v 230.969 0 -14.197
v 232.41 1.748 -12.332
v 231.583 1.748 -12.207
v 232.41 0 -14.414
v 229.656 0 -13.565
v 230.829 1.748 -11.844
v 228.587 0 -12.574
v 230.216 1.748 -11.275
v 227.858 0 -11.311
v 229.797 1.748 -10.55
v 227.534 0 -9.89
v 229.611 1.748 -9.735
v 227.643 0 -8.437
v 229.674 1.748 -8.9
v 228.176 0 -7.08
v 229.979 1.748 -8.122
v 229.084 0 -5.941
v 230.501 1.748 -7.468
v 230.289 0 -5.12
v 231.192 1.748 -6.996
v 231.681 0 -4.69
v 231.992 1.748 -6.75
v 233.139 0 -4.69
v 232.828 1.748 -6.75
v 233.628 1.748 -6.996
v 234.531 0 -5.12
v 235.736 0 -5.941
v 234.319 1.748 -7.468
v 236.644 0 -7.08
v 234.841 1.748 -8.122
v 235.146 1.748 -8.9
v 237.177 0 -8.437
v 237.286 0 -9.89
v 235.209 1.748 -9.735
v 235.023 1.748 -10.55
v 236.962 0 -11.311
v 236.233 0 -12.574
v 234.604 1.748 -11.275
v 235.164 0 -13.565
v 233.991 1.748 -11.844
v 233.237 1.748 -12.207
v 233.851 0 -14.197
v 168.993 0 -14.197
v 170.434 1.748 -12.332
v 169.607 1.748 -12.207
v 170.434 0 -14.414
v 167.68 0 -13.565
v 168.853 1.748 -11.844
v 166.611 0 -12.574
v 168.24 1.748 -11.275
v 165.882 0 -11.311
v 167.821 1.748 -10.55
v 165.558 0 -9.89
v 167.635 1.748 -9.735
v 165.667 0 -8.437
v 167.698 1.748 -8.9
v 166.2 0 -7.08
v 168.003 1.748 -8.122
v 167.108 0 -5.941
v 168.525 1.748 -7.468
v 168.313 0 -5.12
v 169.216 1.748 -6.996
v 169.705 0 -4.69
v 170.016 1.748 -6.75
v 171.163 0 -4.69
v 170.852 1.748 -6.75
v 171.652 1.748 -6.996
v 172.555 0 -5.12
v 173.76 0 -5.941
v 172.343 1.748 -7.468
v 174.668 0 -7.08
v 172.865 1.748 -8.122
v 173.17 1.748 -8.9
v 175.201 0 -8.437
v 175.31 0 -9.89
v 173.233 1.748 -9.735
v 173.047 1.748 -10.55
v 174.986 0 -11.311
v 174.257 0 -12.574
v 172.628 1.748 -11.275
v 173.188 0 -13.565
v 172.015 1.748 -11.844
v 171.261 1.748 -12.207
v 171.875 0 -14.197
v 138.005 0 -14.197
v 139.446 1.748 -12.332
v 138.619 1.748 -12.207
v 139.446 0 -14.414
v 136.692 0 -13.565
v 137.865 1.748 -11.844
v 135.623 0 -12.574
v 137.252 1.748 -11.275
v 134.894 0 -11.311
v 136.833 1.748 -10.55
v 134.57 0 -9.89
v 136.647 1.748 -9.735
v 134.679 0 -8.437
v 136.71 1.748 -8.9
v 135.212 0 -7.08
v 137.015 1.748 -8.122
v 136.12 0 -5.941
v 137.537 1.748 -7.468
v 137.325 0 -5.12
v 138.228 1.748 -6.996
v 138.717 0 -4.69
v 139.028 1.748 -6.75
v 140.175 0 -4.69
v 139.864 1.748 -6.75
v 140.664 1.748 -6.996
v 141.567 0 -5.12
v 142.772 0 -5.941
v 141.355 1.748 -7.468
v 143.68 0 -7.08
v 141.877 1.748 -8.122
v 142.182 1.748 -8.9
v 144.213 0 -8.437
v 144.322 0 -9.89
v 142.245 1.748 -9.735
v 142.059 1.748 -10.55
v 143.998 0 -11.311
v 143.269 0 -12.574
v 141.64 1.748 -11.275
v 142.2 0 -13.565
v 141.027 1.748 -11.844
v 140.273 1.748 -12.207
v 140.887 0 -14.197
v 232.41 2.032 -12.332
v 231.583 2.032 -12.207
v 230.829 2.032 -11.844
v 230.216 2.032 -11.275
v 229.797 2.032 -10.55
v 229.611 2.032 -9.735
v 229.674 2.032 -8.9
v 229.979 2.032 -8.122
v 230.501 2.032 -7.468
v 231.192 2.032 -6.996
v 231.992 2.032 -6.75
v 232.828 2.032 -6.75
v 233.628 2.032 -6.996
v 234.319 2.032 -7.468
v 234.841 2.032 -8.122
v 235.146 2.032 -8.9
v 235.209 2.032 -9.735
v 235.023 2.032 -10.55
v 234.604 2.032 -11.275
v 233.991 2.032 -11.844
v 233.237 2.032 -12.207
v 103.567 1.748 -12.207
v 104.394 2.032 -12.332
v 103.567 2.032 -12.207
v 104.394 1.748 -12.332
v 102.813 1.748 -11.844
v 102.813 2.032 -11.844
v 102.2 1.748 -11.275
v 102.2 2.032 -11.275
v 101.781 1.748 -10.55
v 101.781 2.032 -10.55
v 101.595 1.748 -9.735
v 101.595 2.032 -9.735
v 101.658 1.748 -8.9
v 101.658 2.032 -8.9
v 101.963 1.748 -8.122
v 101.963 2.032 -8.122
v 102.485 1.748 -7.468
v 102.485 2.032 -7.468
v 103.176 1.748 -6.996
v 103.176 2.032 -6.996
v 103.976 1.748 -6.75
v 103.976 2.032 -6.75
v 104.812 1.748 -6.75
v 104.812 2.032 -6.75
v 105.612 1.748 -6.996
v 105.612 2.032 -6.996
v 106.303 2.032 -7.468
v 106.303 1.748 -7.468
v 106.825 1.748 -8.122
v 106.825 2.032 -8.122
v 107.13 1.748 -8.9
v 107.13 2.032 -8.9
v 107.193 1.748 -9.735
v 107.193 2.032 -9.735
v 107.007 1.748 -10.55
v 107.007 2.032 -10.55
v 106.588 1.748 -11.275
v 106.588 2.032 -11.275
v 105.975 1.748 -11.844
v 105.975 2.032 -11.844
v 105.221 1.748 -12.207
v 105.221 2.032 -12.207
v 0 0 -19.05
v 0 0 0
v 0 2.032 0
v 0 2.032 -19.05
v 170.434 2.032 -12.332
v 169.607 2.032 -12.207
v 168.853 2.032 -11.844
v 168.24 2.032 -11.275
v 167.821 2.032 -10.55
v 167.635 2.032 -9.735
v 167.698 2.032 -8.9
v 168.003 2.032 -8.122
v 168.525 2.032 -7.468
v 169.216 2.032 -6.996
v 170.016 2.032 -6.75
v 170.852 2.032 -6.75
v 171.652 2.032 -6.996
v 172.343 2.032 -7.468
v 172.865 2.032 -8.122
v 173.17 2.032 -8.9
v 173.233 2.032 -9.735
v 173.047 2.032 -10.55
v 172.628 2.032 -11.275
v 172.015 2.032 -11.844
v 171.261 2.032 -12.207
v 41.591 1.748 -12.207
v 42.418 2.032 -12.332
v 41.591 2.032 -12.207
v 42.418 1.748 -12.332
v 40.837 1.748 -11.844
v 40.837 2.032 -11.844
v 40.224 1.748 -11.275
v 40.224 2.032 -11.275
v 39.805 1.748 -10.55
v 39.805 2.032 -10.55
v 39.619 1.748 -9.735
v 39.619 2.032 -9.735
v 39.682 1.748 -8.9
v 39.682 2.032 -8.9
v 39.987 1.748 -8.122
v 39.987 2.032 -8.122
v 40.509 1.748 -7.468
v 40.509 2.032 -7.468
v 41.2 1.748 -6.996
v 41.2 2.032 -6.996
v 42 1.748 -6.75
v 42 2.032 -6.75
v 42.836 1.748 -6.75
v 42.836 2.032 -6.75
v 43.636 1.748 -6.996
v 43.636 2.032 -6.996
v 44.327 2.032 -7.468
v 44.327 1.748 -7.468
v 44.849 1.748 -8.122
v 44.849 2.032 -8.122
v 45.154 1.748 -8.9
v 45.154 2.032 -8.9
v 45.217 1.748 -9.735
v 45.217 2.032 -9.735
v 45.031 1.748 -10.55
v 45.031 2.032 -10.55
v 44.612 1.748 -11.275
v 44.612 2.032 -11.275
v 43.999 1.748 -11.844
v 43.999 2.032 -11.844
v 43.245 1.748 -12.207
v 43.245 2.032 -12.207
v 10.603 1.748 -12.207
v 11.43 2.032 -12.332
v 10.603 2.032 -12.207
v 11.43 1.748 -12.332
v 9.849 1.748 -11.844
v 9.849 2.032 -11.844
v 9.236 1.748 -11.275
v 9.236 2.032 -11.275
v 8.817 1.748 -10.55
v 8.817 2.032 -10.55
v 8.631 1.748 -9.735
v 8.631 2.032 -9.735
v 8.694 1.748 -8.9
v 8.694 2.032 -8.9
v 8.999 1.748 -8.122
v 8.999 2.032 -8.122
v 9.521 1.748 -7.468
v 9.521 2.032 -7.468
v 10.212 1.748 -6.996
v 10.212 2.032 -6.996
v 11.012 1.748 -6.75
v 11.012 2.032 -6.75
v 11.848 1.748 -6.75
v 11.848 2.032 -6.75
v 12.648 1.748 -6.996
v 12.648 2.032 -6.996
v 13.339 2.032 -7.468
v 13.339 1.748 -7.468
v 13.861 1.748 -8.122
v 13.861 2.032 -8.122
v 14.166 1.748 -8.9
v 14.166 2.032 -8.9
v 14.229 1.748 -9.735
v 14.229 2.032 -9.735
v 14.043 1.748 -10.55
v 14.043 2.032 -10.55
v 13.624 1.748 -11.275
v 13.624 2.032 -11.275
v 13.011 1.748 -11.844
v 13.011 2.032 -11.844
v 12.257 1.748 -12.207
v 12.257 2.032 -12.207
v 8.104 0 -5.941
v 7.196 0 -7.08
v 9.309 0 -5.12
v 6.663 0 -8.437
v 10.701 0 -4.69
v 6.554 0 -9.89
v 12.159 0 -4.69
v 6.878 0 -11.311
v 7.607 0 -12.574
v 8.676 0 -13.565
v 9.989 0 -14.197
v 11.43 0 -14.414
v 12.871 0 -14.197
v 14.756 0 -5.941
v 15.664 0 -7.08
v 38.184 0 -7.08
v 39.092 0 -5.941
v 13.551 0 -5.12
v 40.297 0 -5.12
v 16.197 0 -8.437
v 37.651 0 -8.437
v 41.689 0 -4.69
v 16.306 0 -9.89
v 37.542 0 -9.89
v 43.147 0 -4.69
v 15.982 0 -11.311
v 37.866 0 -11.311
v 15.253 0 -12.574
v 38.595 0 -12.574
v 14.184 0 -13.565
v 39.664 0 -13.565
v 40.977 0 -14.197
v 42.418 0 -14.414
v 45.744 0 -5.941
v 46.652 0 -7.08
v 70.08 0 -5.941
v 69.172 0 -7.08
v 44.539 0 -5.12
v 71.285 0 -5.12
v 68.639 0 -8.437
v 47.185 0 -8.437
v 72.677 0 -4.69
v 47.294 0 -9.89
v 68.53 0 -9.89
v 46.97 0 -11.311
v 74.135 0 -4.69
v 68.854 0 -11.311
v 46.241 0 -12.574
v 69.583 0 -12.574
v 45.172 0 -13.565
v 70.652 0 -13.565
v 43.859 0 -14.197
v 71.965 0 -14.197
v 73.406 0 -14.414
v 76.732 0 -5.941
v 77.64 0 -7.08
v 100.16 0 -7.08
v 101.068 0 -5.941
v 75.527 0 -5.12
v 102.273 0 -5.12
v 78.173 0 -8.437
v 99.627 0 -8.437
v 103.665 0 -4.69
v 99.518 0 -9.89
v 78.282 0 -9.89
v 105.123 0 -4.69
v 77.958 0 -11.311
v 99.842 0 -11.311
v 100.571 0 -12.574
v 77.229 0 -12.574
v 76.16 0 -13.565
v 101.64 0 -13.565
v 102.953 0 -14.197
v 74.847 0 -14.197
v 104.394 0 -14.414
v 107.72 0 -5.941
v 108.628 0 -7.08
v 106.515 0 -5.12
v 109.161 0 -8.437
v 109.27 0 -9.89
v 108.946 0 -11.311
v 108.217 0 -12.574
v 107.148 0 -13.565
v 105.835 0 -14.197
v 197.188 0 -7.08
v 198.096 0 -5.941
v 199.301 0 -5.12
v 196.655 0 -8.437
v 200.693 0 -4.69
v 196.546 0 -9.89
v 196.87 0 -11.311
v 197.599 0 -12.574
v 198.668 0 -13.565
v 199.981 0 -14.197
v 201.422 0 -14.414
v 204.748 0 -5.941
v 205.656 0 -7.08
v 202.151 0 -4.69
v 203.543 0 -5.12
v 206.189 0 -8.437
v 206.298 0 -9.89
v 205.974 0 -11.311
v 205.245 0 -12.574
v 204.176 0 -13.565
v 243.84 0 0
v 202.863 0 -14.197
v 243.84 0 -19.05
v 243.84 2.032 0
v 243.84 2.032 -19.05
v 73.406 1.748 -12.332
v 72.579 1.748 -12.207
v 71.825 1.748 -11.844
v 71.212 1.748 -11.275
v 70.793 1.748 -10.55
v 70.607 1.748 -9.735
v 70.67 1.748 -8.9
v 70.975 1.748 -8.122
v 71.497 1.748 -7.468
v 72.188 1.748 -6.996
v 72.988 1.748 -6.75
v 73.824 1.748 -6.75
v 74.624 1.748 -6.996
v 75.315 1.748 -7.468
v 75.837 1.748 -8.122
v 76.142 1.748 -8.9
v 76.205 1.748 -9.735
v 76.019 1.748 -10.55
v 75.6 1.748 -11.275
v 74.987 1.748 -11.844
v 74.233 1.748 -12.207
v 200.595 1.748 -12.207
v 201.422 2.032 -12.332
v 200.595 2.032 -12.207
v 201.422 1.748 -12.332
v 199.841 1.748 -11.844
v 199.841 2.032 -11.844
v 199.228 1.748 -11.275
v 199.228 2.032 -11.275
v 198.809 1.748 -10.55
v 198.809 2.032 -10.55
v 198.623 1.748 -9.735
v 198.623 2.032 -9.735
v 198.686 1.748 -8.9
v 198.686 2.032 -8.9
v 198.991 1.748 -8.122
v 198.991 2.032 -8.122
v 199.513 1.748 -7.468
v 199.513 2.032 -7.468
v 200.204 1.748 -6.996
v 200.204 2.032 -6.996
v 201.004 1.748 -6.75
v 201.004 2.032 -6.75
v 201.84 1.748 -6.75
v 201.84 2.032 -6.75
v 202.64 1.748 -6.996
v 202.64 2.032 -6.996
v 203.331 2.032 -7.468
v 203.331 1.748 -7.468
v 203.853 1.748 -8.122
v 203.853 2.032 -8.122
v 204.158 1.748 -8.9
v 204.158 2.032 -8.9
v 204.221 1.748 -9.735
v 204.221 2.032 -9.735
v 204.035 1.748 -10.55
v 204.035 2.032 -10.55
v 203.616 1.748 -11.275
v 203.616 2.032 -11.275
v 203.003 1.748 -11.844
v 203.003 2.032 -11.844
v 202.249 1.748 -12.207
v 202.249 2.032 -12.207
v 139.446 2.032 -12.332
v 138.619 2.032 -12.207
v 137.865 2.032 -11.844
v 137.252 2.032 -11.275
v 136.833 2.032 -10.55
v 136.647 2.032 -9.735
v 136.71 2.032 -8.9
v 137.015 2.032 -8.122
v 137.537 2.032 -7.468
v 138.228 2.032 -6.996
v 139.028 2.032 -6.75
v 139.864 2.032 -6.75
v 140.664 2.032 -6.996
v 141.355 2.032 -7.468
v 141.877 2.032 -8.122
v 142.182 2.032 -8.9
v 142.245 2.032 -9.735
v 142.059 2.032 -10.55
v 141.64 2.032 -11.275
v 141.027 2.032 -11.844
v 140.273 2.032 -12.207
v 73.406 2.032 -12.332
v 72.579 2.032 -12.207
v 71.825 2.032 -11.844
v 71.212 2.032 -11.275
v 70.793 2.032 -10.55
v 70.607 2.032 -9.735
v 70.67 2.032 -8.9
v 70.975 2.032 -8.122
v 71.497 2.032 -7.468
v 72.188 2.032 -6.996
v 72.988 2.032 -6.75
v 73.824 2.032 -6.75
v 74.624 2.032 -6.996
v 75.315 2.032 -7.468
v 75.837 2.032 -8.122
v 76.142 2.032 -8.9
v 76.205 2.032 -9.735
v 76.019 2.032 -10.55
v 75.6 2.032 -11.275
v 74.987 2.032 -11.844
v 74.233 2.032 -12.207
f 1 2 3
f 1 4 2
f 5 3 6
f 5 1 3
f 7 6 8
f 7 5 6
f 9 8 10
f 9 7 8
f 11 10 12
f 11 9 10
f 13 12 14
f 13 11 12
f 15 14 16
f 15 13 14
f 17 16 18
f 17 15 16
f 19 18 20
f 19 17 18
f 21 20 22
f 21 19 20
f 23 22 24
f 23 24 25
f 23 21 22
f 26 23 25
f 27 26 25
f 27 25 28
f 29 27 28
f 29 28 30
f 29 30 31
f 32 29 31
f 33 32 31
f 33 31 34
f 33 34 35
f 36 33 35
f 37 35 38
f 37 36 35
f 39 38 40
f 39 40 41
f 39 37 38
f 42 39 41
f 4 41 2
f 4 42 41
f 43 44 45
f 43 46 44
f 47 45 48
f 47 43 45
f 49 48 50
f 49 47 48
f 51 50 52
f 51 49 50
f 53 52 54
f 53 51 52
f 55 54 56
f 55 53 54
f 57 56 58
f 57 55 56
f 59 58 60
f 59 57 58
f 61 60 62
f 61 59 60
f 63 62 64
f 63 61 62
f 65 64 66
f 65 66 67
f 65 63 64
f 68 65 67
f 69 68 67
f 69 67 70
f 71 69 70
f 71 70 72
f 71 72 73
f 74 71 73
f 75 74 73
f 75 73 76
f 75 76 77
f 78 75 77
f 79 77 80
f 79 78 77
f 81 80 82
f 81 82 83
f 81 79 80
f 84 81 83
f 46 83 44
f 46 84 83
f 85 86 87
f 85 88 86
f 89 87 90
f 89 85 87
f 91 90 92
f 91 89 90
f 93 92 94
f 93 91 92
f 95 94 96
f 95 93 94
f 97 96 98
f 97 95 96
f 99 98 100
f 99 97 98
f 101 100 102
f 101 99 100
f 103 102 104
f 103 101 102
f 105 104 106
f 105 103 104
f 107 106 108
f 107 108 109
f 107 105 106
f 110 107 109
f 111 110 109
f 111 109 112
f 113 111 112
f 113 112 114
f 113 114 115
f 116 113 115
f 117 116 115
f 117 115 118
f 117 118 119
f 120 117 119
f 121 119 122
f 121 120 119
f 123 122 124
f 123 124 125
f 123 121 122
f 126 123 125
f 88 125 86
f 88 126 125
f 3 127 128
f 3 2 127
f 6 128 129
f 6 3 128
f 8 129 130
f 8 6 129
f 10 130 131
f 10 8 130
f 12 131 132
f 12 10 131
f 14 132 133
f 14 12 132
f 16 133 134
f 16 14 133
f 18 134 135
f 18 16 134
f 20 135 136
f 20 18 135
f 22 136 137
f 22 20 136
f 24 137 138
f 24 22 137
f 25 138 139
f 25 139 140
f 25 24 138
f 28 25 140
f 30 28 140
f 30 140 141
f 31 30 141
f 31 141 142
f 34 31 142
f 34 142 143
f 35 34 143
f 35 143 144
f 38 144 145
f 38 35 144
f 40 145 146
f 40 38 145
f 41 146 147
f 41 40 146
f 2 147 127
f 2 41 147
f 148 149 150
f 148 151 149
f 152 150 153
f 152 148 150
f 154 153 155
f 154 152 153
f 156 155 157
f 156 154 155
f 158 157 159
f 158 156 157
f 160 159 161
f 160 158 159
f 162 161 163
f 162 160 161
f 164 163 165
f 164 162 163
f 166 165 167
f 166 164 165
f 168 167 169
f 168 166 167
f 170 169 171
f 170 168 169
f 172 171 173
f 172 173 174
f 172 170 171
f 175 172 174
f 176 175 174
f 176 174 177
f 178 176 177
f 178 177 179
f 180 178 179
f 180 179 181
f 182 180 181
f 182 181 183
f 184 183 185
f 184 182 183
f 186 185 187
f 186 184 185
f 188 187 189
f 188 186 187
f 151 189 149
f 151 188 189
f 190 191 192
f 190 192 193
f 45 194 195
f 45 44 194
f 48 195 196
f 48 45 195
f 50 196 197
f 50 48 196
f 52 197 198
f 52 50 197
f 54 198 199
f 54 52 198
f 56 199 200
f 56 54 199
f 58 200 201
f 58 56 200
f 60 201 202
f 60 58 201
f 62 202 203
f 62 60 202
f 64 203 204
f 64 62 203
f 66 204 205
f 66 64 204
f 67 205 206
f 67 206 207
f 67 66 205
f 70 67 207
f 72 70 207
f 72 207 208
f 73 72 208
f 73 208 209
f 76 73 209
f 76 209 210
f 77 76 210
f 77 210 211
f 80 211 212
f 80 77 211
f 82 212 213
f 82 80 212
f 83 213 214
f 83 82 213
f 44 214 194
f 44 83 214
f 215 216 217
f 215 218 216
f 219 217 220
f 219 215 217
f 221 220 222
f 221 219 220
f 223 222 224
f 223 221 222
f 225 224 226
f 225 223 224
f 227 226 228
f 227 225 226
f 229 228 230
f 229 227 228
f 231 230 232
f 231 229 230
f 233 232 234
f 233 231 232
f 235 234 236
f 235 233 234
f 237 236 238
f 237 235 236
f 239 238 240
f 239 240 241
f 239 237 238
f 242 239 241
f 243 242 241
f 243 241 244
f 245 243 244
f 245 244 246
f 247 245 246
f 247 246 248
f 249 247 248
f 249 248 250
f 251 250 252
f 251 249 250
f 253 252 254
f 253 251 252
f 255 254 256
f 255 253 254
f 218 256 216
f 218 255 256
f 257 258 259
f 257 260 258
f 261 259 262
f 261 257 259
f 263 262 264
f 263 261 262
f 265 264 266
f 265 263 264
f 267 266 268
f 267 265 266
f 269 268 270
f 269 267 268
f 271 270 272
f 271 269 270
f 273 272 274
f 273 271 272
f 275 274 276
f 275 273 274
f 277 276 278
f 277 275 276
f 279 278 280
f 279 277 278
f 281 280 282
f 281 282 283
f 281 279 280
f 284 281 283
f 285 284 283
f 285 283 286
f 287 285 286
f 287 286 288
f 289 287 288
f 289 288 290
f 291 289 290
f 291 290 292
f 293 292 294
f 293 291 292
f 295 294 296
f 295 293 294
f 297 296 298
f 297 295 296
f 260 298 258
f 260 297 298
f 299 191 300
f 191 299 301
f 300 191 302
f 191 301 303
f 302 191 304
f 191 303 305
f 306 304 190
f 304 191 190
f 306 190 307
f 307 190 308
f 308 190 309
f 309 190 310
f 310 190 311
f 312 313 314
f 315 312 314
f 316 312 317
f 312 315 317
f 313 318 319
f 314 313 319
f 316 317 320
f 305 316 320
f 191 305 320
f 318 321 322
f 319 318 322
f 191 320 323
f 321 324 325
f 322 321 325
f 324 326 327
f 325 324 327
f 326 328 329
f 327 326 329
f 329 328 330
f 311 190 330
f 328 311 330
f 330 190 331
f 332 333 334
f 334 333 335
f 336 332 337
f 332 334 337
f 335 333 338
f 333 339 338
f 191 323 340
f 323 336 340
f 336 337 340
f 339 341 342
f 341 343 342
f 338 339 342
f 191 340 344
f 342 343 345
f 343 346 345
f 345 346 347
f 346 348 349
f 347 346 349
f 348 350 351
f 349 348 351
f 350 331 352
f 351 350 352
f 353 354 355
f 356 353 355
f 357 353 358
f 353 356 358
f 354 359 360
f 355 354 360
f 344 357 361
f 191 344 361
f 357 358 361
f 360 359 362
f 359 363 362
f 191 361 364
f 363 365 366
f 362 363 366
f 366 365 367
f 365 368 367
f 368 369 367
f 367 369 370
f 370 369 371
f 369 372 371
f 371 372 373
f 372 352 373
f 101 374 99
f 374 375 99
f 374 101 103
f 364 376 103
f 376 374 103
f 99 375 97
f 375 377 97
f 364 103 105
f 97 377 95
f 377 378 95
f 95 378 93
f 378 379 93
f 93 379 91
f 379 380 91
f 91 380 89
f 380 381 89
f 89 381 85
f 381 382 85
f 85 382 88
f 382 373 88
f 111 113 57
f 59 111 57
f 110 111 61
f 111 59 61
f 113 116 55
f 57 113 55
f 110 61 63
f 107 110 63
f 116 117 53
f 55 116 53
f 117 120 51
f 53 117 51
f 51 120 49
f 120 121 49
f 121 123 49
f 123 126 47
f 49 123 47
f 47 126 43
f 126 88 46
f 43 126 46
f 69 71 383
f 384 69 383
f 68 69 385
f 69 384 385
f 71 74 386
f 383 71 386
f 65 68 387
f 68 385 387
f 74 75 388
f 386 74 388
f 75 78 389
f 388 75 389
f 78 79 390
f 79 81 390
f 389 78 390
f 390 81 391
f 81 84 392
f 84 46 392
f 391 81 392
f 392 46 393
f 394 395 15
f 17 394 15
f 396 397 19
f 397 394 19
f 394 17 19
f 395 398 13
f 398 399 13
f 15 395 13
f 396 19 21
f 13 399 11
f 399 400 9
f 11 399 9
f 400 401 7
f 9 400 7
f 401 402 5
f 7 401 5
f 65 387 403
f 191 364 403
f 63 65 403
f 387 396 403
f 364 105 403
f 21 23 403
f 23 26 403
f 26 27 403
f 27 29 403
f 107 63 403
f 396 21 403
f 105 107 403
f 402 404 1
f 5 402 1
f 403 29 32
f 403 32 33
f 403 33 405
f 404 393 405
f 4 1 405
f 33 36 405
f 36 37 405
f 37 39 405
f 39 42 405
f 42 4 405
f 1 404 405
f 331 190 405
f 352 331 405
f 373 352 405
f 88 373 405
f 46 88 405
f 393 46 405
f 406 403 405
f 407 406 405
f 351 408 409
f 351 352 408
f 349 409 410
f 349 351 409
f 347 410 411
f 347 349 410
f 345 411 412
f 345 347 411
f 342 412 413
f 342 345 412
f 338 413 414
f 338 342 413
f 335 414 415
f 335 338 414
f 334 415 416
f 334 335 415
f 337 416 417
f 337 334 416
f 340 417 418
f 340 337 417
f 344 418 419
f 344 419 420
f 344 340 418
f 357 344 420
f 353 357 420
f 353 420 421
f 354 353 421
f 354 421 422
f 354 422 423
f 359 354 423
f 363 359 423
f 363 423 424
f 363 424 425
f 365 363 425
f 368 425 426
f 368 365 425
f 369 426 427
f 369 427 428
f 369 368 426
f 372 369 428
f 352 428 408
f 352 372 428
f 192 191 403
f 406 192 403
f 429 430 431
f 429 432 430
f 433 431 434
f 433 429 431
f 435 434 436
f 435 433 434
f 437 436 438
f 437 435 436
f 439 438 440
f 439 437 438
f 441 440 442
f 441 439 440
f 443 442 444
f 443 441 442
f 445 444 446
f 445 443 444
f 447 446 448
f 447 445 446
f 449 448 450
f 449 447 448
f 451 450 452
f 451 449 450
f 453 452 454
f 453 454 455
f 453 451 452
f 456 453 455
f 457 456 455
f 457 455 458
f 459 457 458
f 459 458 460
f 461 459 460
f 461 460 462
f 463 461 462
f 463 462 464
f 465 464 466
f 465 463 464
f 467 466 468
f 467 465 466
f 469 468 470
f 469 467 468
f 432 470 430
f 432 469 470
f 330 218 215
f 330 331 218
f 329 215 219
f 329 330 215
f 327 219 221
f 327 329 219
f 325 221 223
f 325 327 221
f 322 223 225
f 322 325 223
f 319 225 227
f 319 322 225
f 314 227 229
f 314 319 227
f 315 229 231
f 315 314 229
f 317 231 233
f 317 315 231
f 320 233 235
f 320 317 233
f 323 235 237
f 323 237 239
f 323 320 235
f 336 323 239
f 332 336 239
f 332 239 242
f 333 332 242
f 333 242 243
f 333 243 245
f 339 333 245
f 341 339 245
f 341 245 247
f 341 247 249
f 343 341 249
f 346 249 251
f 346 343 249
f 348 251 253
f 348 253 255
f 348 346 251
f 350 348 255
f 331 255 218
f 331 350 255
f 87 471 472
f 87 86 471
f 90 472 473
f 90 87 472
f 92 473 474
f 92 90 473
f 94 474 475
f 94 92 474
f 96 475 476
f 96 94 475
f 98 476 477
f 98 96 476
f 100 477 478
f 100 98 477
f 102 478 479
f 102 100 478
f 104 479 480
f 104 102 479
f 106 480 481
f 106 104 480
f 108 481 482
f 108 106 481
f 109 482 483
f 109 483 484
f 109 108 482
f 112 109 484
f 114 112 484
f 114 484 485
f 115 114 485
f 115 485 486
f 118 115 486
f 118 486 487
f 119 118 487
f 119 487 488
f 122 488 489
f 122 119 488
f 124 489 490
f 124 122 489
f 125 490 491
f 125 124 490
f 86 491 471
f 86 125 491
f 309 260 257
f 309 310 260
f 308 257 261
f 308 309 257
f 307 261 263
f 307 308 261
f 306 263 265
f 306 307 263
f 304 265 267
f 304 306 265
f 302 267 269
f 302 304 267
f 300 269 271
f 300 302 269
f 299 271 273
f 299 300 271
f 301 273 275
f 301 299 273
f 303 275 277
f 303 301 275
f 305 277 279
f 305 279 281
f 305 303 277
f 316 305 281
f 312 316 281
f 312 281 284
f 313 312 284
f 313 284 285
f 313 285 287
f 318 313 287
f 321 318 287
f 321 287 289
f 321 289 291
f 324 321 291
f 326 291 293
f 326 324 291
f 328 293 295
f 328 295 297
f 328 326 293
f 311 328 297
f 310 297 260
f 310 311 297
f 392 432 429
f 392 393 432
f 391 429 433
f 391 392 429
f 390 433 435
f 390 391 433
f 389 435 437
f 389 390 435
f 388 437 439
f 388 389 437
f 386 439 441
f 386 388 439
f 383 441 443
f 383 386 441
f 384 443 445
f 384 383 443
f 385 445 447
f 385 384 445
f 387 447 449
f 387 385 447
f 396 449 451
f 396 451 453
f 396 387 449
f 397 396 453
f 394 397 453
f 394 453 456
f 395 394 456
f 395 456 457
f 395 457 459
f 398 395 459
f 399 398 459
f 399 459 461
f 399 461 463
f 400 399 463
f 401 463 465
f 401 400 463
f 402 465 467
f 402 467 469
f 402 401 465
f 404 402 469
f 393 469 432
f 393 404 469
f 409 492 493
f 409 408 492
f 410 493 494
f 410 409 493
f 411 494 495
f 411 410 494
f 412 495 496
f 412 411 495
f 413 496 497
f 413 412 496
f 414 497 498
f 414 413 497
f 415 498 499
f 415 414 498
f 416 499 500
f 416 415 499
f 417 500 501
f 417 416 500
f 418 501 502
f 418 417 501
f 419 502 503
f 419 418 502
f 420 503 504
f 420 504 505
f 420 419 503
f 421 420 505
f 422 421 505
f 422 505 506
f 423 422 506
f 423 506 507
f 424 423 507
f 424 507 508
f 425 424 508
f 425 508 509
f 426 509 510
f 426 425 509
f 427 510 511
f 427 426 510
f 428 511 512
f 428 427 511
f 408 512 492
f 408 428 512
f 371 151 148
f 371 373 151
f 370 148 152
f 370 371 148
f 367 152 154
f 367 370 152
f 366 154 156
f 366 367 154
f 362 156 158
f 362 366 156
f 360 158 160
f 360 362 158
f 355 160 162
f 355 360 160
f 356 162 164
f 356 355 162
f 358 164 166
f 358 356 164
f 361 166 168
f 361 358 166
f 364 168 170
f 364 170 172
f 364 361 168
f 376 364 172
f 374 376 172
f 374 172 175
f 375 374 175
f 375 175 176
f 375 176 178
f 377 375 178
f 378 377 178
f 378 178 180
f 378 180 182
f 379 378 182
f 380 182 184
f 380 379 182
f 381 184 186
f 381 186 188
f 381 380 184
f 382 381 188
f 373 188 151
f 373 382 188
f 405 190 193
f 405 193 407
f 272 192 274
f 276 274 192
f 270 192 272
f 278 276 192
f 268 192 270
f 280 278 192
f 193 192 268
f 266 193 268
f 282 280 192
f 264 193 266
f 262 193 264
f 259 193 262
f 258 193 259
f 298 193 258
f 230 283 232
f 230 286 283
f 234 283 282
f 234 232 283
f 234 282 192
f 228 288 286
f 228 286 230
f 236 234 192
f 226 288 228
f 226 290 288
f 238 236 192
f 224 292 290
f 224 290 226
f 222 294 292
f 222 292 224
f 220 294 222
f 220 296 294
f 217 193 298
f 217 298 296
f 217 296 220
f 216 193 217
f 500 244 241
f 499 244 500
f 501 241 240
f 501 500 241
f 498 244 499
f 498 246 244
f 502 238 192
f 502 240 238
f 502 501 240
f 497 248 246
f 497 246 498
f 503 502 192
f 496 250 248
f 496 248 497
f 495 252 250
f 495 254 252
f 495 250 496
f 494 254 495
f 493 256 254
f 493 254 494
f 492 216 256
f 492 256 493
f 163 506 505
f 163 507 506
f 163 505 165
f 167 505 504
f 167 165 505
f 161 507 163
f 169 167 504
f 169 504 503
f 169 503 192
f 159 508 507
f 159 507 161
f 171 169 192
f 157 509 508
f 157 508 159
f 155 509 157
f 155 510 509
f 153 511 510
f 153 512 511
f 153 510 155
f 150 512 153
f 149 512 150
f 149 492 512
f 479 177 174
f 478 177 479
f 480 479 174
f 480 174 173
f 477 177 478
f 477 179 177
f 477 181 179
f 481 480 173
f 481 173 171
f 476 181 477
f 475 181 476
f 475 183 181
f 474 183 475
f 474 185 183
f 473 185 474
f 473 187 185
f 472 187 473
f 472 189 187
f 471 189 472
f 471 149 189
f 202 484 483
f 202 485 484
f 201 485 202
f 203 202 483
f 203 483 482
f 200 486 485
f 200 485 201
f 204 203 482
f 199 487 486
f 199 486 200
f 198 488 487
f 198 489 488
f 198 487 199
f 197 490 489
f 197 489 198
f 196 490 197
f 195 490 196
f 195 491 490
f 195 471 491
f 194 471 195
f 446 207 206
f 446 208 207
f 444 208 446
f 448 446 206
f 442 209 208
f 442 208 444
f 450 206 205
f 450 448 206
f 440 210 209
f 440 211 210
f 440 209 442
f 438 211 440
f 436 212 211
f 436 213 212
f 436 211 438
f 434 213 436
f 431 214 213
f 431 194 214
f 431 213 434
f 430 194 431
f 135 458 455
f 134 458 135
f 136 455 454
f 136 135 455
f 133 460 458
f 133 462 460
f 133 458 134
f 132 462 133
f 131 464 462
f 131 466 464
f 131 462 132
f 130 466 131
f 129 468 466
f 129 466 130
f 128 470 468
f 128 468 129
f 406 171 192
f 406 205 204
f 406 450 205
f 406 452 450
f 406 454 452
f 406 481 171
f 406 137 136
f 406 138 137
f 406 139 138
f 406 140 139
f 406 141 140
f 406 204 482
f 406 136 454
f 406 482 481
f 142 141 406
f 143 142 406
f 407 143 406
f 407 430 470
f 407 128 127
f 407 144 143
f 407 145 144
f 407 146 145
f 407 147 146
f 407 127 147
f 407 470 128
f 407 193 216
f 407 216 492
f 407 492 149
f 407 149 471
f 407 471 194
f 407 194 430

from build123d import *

# Parameters (mm, degrees)
SKETCH1_W                                  = 243.84
SKETCH1_H                                  = 19.05
BOSS_EXTRUDE1_DEPTH                        = 2.032
CSK_FOR_10_FLAT_HEAD_MACHINE_SCREW_2_COUNT = 2
CSK_FOR_10_FLAT_HEAD_MACHINE_SCREW_2_PITCH = 30.988
CSK_FOR_10_FLAT_HEAD_MACHINE_SCREW_3_COUNT = 2
CSK_FOR_10_FLAT_HEAD_MACHINE_SCREW_3_PITCH = 61.976
CSK_FOR_10_FLAT_HEAD_MACHINE_SCREW_4_COUNT = 2
CSK_FOR_10_FLAT_HEAD_MACHINE_SCREW_4_PITCH = 92.964
CSK_FOR_10_FLAT_HEAD_MACHINE_SCREW_5_COUNT = 2
CSK_FOR_10_FLAT_HEAD_MACHINE_SCREW_5_PITCH = 128.016
CSK_FOR_10_FLAT_HEAD_MACHINE_SCREW_6_COUNT = 2
CSK_FOR_10_FLAT_HEAD_MACHINE_SCREW_6_PITCH = 159.004
CSK_FOR_10_FLAT_HEAD_MACHINE_SCREW_7_COUNT = 2
CSK_FOR_10_FLAT_HEAD_MACHINE_SCREW_7_PITCH = 189.992
CSK_FOR_10_FLAT_HEAD_MACHINE_SCREW_8_COUNT = 2
CSK_FOR_10_FLAT_HEAD_MACHINE_SCREW_8_PITCH = 220.98


with BuildPart() as part:
    # Sketch1 → Boss-Extrude1 (new body)
    with BuildSketch(Plane(origin=(0, 0, 0), x_dir=(1, 0, 0), z_dir=(0, 1, 0))):
        with Locations((121.92, 9.525)):
            Rectangle(SKETCH1_W, SKETCH1_H)
    extrude(amount=BOSS_EXTRUDE1_DEPTH)

    # Sketch3 → CSK for #10 Flat Head Machine Screw (100)1 (revolve, cut)
    with BuildSketch(Plane(origin=(11.43, 0, -9.525), x_dir=(0, 0, -1), z_dir=(1, 0, 0))):
        Polygon((0, 0), (0, 2.032), (2.8067, 2.032), (2.8067, 1.747676712), (4.8895, 0), align=None)
    csk_for_10_flat_head_machine_screw_100 = revolve(axis=Axis((11.43, -6.35, -9.525), (0, 1, 0)), mode=Mode.SUBTRACT)

    # CSK for _10 Flat Head Machine Screw  2: CSK for #10 Flat Head Machine Screw (100)1 ×2
    with Locations(*[(i * CSK_FOR_10_FLAT_HEAD_MACHINE_SCREW_2_PITCH, 0, 0) for i in range(1, CSK_FOR_10_FLAT_HEAD_MACHINE_SCREW_2_COUNT)]):
        add(csk_for_10_flat_head_machine_screw_100, mode=Mode.SUBTRACT)

    # CSK for _10 Flat Head Machine Screw  3: CSK for #10 Flat Head Machine Screw (100)1 ×2
    with Locations(*[(i * CSK_FOR_10_FLAT_HEAD_MACHINE_SCREW_3_PITCH, 0, 0) for i in range(1, CSK_FOR_10_FLAT_HEAD_MACHINE_SCREW_3_COUNT)]):
        add(csk_for_10_flat_head_machine_screw_100, mode=Mode.SUBTRACT)

    # CSK for _10 Flat Head Machine Screw  4: CSK for #10 Flat Head Machine Screw (100)1 ×2
    with Locations(*[(i * CSK_FOR_10_FLAT_HEAD_MACHINE_SCREW_4_PITCH, 0, 0) for i in range(1, CSK_FOR_10_FLAT_HEAD_MACHINE_SCREW_4_COUNT)]):
        add(csk_for_10_flat_head_machine_screw_100, mode=Mode.SUBTRACT)

    # CSK for _10 Flat Head Machine Screw  5: CSK for #10 Flat Head Machine Screw (100)1 ×2
    with Locations(*[(i * CSK_FOR_10_FLAT_HEAD_MACHINE_SCREW_5_PITCH, 0, 0) for i in range(1, CSK_FOR_10_FLAT_HEAD_MACHINE_SCREW_5_COUNT)]):
        add(csk_for_10_flat_head_machine_screw_100, mode=Mode.SUBTRACT)

    # CSK for _10 Flat Head Machine Screw  6: CSK for #10 Flat Head Machine Screw (100)1 ×2
    with Locations(*[(i * CSK_FOR_10_FLAT_HEAD_MACHINE_SCREW_6_PITCH, 0, 0) for i in range(1, CSK_FOR_10_FLAT_HEAD_MACHINE_SCREW_6_COUNT)]):
        add(csk_for_10_flat_head_machine_screw_100, mode=Mode.SUBTRACT)

    # CSK for _10 Flat Head Machine Screw  7: CSK for #10 Flat Head Machine Screw (100)1 ×2
    with Locations(*[(i * CSK_FOR_10_FLAT_HEAD_MACHINE_SCREW_7_PITCH, 0, 0) for i in range(1, CSK_FOR_10_FLAT_HEAD_MACHINE_SCREW_7_COUNT)]):
        add(csk_for_10_flat_head_machine_screw_100, mode=Mode.SUBTRACT)

    # CSK for _10 Flat Head Machine Screw  8: CSK for #10 Flat Head Machine Screw (100)1 ×2
    with Locations(*[(i * CSK_FOR_10_FLAT_HEAD_MACHINE_SCREW_8_PITCH, 0, 0) for i in range(1, CSK_FOR_10_FLAT_HEAD_MACHINE_SCREW_8_COUNT)]):
        add(csk_for_10_flat_head_machine_screw_100, mode=Mode.SUBTRACT)


solid = part.part
